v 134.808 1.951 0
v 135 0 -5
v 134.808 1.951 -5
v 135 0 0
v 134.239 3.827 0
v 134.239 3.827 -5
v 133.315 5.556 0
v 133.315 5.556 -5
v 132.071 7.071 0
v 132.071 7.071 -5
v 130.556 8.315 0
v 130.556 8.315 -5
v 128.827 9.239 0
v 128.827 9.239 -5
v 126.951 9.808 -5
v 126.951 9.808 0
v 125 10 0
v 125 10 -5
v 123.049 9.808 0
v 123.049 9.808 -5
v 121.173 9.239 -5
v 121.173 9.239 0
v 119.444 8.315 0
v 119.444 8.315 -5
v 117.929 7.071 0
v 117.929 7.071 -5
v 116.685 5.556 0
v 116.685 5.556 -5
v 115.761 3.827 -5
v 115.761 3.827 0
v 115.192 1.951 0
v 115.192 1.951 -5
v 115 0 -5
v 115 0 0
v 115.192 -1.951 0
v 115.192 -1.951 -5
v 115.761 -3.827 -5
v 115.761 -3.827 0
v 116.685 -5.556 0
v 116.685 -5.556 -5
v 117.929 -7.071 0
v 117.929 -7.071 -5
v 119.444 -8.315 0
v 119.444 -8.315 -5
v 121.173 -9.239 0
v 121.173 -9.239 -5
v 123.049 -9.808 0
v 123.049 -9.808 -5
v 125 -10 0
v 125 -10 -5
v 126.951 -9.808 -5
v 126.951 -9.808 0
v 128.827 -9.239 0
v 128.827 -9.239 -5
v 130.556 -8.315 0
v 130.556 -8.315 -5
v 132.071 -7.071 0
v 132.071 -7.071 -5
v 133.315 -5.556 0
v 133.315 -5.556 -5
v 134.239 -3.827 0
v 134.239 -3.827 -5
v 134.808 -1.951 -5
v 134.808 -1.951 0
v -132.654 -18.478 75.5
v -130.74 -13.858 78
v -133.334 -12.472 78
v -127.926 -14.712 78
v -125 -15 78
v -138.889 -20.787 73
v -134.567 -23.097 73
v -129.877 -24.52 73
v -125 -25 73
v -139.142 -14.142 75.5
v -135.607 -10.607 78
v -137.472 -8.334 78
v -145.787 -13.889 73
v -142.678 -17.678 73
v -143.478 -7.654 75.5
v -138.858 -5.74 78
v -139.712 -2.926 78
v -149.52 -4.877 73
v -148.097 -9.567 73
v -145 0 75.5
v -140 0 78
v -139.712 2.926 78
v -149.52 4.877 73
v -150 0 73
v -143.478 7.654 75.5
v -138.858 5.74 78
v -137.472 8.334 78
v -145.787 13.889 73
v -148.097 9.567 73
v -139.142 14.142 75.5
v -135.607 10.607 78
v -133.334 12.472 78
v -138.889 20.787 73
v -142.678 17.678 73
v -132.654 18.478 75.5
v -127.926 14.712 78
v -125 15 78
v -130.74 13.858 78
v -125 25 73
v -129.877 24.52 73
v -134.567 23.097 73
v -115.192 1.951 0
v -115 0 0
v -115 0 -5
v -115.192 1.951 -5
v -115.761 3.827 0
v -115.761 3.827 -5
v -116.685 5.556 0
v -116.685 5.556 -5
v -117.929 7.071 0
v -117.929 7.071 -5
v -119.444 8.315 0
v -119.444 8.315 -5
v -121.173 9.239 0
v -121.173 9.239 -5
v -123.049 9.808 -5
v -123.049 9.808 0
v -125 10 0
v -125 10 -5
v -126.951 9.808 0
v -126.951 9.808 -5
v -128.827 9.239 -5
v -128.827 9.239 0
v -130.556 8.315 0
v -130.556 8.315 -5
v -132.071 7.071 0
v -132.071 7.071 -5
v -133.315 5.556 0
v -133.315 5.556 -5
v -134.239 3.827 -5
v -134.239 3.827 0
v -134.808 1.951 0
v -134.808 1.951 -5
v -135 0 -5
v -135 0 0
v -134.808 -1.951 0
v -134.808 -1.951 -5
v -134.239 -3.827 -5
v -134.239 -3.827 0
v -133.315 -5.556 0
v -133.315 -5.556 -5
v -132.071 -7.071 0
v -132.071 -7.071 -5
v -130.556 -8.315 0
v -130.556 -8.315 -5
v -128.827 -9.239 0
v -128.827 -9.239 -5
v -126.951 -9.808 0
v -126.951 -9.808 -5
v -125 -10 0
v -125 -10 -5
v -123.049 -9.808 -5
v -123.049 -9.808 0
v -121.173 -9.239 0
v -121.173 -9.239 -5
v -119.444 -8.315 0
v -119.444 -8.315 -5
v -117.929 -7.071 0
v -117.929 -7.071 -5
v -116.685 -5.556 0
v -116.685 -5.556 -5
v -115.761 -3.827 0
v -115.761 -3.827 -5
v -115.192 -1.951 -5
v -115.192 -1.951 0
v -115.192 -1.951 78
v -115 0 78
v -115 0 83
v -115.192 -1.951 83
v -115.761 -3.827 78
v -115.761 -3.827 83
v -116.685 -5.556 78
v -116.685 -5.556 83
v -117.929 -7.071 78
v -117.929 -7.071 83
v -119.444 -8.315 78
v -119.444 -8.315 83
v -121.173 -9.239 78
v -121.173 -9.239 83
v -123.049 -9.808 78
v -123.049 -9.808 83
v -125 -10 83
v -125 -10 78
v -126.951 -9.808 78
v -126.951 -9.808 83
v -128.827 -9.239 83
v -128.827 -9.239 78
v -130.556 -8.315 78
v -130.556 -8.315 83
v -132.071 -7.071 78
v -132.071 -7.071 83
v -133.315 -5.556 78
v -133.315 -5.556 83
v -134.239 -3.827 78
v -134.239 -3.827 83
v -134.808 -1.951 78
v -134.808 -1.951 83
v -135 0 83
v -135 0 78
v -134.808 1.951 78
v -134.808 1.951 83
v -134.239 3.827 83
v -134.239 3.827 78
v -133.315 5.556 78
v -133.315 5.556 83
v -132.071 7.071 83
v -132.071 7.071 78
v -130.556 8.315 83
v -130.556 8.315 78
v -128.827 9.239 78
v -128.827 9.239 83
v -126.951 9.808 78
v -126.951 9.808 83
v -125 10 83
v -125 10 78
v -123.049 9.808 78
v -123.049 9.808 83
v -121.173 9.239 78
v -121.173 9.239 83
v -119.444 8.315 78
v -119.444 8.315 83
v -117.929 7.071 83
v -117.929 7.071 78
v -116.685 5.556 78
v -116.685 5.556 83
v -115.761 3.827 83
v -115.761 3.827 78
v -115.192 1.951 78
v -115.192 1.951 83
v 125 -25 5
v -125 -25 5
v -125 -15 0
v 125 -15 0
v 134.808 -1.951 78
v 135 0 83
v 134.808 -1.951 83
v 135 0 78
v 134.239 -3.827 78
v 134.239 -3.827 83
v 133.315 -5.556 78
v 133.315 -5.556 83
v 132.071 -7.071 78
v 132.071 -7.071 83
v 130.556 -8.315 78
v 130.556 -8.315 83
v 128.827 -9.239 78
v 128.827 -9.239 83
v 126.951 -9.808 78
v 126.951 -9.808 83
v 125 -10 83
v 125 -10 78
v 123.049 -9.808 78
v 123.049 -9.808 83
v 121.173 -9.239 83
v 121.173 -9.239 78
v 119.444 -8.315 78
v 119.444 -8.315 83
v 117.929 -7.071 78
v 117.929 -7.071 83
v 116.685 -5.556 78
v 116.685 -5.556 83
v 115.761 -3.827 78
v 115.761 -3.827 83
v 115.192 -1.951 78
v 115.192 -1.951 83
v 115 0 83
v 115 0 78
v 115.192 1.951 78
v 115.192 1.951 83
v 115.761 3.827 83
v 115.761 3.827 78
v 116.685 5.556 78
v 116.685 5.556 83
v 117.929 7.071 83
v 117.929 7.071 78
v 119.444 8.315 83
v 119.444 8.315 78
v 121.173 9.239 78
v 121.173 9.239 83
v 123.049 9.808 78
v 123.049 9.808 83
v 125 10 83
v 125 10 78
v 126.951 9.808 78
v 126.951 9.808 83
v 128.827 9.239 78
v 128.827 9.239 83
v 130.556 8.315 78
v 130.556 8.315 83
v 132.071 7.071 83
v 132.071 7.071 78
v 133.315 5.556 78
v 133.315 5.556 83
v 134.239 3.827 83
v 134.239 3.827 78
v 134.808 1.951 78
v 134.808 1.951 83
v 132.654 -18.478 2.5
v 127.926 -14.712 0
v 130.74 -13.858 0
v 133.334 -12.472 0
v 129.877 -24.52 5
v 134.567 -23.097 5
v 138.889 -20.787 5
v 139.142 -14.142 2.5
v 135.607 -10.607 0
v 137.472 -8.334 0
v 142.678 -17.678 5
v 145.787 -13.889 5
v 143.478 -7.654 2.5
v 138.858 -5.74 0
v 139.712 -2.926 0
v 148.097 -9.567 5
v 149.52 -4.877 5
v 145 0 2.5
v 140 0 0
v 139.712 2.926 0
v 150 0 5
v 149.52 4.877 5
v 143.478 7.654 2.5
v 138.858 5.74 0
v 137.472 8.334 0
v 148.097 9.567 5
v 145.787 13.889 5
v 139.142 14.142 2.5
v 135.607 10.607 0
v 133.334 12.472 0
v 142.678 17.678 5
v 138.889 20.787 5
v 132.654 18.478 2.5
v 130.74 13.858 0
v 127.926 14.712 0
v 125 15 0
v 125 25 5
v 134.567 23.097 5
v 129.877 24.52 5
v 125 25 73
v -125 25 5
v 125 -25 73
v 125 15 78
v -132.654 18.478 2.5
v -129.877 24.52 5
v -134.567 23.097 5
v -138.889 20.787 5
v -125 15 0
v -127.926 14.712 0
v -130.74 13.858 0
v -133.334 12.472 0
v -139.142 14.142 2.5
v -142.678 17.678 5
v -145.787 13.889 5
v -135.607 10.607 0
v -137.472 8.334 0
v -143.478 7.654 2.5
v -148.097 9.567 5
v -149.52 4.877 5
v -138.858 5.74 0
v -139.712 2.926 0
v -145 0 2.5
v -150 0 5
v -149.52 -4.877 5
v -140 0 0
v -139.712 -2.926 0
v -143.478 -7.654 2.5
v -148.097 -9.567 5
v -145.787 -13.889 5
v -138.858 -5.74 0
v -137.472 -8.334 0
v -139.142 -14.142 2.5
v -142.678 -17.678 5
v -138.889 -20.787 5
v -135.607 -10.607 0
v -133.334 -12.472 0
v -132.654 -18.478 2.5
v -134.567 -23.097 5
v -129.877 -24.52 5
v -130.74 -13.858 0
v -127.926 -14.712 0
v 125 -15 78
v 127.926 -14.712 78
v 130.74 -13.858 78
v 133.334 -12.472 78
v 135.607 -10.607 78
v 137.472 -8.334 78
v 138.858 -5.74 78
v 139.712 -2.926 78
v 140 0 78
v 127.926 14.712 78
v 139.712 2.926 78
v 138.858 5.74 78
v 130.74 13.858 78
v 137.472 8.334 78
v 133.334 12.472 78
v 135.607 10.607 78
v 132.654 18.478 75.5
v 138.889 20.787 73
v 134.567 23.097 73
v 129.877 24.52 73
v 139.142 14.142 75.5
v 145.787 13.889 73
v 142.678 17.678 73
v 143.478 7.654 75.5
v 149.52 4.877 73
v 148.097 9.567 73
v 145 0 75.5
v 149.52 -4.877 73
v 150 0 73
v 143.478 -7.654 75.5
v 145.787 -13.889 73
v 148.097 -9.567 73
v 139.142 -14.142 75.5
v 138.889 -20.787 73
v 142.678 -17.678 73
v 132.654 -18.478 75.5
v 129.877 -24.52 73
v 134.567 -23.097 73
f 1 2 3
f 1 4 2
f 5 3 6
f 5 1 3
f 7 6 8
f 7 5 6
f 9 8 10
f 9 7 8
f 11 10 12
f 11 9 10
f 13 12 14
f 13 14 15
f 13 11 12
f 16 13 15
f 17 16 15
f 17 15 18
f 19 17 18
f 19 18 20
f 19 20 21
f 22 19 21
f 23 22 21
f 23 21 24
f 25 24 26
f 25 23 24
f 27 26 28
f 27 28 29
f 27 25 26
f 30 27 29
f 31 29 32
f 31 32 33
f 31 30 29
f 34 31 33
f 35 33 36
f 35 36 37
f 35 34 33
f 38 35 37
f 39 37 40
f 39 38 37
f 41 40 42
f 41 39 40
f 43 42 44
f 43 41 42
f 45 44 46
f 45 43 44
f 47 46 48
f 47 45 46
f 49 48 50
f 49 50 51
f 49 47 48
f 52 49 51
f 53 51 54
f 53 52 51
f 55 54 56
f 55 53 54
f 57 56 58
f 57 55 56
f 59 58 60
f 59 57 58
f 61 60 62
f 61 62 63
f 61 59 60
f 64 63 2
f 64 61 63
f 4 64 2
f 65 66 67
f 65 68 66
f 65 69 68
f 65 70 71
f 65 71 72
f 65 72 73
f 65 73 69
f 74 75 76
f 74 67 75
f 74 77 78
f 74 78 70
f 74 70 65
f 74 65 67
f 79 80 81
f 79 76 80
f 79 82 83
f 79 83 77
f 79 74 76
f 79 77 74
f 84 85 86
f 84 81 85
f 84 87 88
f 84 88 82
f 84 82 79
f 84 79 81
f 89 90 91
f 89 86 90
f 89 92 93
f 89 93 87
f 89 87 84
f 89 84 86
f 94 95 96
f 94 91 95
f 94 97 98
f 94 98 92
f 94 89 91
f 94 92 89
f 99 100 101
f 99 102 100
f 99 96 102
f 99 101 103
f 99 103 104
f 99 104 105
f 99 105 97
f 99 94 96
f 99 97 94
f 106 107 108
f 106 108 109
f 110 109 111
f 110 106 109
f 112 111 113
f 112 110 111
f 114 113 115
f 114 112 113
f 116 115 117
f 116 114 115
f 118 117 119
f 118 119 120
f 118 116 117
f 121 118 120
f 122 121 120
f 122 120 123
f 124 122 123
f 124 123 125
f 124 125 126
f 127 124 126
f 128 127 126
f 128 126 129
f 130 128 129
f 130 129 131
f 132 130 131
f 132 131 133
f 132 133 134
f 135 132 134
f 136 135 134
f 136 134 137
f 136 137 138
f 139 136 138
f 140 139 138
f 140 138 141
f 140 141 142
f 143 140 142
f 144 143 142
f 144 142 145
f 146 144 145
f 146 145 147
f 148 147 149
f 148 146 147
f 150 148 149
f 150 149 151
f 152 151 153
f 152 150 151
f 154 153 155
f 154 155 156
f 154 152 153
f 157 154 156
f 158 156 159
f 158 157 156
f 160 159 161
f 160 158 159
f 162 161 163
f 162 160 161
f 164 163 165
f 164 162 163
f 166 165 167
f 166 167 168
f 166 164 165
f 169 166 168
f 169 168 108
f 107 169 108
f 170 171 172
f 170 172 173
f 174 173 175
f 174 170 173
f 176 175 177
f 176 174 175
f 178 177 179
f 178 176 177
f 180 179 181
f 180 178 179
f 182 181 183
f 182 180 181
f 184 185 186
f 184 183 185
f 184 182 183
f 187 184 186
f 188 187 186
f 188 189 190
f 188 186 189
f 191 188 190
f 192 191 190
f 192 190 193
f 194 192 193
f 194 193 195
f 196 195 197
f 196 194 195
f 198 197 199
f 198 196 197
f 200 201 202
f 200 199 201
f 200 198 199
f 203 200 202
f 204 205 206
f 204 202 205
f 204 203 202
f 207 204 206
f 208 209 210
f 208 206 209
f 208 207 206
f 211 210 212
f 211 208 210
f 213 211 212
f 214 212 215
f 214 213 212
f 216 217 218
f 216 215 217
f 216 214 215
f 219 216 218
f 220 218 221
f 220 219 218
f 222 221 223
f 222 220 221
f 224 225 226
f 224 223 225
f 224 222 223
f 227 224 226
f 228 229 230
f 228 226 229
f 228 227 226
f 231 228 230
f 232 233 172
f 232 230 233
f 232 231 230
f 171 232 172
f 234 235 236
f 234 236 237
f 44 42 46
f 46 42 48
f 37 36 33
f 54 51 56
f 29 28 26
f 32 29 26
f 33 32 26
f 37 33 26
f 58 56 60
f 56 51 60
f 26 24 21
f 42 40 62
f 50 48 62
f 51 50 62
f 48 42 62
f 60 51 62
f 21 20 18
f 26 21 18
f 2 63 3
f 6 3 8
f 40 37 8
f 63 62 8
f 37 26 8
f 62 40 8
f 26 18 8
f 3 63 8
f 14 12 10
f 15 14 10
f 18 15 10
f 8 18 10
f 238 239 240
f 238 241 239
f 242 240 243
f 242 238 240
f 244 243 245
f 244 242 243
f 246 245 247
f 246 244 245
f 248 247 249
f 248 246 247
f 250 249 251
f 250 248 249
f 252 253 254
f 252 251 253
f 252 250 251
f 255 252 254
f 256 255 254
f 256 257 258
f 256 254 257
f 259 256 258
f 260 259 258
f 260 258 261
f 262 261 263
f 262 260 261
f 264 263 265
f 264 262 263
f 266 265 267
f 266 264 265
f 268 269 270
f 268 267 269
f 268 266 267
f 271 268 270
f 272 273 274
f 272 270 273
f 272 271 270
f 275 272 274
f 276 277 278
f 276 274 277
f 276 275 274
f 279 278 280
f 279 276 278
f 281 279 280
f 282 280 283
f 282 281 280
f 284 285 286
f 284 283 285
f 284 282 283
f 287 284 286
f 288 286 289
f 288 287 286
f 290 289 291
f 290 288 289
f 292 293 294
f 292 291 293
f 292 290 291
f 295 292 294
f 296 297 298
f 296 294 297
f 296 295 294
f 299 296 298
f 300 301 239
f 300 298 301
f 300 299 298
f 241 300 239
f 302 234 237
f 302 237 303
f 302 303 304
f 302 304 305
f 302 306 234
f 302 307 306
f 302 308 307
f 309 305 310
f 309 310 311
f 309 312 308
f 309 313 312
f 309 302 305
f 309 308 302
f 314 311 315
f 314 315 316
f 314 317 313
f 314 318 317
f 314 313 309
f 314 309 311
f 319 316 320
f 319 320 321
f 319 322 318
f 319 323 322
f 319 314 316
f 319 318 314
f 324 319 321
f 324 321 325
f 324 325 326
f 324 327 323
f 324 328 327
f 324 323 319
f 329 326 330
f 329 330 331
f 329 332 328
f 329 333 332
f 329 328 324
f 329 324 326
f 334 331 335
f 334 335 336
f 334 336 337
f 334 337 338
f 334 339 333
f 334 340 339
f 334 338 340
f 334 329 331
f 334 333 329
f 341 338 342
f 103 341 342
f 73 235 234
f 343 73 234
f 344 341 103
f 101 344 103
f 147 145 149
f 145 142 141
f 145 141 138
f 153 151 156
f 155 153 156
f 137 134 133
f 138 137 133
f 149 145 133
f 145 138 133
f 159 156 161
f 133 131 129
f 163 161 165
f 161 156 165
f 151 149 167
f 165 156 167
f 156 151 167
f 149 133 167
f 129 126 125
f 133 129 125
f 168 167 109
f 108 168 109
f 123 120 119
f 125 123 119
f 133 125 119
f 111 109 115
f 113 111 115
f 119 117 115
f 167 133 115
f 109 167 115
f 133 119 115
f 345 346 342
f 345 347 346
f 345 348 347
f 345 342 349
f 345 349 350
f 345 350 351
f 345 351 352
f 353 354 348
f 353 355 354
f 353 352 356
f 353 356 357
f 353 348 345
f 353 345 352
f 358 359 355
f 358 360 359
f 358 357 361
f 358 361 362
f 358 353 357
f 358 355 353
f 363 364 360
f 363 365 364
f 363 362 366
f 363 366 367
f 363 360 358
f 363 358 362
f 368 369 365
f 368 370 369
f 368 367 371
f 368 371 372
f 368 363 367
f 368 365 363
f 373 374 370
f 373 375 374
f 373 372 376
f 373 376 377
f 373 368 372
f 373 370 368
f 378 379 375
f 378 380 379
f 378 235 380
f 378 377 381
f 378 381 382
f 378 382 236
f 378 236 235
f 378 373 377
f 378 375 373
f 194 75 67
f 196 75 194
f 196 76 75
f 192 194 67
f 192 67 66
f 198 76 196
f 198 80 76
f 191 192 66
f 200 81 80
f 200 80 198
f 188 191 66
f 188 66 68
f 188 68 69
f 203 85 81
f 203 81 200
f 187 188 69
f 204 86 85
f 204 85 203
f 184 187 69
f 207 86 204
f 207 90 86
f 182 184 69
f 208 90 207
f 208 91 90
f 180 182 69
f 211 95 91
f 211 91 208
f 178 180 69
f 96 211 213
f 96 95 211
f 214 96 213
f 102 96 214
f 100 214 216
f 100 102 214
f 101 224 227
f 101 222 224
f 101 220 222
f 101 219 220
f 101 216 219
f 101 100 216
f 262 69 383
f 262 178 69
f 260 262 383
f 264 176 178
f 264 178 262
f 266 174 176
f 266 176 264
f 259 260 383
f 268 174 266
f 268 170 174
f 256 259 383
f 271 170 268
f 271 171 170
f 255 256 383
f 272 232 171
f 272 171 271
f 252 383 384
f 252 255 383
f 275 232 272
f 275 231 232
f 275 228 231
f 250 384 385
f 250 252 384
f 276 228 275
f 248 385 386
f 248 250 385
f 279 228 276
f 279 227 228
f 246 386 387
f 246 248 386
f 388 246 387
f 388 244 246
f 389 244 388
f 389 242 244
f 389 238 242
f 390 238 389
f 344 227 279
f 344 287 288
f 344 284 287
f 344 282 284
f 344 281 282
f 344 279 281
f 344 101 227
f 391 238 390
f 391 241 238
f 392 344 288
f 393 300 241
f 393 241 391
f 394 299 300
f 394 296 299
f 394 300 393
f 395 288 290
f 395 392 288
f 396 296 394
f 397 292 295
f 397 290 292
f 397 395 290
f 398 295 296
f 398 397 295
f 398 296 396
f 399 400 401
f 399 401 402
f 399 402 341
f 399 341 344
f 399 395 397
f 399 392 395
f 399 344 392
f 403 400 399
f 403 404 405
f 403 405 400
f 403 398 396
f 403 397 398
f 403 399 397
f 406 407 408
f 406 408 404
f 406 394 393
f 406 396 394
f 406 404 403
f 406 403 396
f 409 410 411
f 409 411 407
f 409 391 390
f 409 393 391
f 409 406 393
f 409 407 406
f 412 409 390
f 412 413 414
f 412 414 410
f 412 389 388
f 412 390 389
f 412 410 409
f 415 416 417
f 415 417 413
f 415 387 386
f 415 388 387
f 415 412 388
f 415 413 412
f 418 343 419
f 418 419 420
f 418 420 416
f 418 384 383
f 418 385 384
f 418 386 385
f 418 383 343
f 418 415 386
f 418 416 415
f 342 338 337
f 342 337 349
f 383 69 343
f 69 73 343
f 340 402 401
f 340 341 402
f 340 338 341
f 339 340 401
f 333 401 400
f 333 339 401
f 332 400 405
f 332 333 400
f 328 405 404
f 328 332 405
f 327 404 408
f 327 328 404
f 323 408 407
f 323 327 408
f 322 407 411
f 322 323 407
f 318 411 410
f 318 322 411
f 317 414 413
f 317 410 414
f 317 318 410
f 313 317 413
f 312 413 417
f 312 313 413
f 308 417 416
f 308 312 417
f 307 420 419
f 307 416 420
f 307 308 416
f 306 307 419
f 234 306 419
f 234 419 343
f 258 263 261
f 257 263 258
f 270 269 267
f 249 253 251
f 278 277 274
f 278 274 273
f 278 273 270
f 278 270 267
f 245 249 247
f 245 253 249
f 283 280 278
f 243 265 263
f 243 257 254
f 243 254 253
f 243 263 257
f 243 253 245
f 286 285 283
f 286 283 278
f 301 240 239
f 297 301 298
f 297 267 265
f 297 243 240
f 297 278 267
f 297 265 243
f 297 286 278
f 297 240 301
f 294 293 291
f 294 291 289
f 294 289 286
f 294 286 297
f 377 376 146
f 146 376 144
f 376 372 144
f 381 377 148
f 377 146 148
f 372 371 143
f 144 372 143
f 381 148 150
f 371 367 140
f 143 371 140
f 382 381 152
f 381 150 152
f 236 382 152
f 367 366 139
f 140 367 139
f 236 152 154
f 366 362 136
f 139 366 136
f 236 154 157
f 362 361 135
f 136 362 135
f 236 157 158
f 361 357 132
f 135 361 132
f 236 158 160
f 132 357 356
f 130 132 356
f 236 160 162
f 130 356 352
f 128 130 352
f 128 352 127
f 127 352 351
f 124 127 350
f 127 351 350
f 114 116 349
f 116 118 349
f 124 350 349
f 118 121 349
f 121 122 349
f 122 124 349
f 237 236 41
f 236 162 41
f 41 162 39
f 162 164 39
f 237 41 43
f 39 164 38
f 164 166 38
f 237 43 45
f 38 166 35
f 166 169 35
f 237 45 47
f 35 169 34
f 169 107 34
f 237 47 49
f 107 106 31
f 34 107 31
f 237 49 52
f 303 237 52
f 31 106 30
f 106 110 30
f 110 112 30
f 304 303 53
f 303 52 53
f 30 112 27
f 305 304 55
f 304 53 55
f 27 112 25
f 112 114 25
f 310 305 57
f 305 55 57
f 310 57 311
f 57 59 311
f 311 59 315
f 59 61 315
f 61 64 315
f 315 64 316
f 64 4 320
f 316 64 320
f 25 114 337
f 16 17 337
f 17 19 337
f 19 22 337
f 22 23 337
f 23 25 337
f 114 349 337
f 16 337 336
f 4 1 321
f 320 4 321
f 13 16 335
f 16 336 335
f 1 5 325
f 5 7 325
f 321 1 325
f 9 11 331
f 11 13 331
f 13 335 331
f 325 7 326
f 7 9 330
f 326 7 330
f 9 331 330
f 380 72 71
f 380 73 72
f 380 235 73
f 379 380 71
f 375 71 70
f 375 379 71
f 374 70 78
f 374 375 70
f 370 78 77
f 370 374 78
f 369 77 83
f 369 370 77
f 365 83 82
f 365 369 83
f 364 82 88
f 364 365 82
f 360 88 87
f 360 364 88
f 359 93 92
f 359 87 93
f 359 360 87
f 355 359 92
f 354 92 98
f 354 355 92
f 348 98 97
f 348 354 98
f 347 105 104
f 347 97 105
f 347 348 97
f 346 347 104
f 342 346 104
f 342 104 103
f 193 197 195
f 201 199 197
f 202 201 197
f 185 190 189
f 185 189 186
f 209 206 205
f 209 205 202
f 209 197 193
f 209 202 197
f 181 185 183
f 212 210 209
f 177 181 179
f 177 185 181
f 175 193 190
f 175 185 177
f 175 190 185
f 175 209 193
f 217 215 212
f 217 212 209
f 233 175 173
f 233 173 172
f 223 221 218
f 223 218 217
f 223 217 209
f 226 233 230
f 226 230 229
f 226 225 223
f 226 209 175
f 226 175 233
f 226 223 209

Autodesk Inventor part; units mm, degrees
ref_plane "YZ Plane" through (0, 0, 0) normal (1, 0, 0) x (0, 1, 0)
ref_plane "XZ Plane" through (0, 0, 0) normal (0, 1, 0) x (-1, 0, 0)
ref_plane "XY Plane" through (0, 0, 0) normal (0, 0, 1) x (1, 0, 0)
sketch "Sketch1" plane through (0, 0, 0) normal (0, 0, 1) x (1, 0, 0)
  line L0 (-125, 0) -> (125, 0) construction
  line L1 (-125, -25) -> (125, -25)
  line L2 (125, 25) -> (-125, 25)
  arc A0 (-125, 25) -> (-125, -25) centre (-125, 0) ccw
  arc A1 (125, -25) -> (125, 25) centre (125, 0) ccw
  point P0 (0, 0)
  dimension "d0" = 125
  dimension "d1" = 50
extrude "Extrusion1" add sketch "Sketch1" along normal blind 78
chamfer "Chamfer1" distance 10 distance2 5 4 edges at (0, -25, 0) (150, 0, 0) (0, 25, 0) (-150, 0, 0) measured on face at (41.6667, -8.3333, 0)
chamfer "Chamfer2" distance 10 distance2 5 4 edges at (0, 25, 78) (-150, 0, 78) (0, -25, 78) (150, 0, 78) measured on face at (41.6667, -8.3333, 78)
sketch "Sketch2" plane through (0, 0, 78) normal (0, 0, 1) x (1, 0, 0)
  point P0 (0, 0)
sketch "Sketch3" plane through (0, 0, 78) normal (0, 0, 1) x (1, 0, 0)
  arc A0 (-125, 15) -> (-125, -15) centre (-125, 0) ccw projected
  arc A1 (125, -15) -> (125, 15) centre (125, 0) ccw projected
  circle A2 centre (-125, 0) radius 10
  circle A3 centre (125, 0) radius 10
  point P0 (0, 0)
  dimension "d10" = 20
  dimension "d11" = 20
extrude "Extrusion2" add sketch "Sketch3" along normal blind 5 and the other way blind 83
properties part number "Arm 2 v0.1"
